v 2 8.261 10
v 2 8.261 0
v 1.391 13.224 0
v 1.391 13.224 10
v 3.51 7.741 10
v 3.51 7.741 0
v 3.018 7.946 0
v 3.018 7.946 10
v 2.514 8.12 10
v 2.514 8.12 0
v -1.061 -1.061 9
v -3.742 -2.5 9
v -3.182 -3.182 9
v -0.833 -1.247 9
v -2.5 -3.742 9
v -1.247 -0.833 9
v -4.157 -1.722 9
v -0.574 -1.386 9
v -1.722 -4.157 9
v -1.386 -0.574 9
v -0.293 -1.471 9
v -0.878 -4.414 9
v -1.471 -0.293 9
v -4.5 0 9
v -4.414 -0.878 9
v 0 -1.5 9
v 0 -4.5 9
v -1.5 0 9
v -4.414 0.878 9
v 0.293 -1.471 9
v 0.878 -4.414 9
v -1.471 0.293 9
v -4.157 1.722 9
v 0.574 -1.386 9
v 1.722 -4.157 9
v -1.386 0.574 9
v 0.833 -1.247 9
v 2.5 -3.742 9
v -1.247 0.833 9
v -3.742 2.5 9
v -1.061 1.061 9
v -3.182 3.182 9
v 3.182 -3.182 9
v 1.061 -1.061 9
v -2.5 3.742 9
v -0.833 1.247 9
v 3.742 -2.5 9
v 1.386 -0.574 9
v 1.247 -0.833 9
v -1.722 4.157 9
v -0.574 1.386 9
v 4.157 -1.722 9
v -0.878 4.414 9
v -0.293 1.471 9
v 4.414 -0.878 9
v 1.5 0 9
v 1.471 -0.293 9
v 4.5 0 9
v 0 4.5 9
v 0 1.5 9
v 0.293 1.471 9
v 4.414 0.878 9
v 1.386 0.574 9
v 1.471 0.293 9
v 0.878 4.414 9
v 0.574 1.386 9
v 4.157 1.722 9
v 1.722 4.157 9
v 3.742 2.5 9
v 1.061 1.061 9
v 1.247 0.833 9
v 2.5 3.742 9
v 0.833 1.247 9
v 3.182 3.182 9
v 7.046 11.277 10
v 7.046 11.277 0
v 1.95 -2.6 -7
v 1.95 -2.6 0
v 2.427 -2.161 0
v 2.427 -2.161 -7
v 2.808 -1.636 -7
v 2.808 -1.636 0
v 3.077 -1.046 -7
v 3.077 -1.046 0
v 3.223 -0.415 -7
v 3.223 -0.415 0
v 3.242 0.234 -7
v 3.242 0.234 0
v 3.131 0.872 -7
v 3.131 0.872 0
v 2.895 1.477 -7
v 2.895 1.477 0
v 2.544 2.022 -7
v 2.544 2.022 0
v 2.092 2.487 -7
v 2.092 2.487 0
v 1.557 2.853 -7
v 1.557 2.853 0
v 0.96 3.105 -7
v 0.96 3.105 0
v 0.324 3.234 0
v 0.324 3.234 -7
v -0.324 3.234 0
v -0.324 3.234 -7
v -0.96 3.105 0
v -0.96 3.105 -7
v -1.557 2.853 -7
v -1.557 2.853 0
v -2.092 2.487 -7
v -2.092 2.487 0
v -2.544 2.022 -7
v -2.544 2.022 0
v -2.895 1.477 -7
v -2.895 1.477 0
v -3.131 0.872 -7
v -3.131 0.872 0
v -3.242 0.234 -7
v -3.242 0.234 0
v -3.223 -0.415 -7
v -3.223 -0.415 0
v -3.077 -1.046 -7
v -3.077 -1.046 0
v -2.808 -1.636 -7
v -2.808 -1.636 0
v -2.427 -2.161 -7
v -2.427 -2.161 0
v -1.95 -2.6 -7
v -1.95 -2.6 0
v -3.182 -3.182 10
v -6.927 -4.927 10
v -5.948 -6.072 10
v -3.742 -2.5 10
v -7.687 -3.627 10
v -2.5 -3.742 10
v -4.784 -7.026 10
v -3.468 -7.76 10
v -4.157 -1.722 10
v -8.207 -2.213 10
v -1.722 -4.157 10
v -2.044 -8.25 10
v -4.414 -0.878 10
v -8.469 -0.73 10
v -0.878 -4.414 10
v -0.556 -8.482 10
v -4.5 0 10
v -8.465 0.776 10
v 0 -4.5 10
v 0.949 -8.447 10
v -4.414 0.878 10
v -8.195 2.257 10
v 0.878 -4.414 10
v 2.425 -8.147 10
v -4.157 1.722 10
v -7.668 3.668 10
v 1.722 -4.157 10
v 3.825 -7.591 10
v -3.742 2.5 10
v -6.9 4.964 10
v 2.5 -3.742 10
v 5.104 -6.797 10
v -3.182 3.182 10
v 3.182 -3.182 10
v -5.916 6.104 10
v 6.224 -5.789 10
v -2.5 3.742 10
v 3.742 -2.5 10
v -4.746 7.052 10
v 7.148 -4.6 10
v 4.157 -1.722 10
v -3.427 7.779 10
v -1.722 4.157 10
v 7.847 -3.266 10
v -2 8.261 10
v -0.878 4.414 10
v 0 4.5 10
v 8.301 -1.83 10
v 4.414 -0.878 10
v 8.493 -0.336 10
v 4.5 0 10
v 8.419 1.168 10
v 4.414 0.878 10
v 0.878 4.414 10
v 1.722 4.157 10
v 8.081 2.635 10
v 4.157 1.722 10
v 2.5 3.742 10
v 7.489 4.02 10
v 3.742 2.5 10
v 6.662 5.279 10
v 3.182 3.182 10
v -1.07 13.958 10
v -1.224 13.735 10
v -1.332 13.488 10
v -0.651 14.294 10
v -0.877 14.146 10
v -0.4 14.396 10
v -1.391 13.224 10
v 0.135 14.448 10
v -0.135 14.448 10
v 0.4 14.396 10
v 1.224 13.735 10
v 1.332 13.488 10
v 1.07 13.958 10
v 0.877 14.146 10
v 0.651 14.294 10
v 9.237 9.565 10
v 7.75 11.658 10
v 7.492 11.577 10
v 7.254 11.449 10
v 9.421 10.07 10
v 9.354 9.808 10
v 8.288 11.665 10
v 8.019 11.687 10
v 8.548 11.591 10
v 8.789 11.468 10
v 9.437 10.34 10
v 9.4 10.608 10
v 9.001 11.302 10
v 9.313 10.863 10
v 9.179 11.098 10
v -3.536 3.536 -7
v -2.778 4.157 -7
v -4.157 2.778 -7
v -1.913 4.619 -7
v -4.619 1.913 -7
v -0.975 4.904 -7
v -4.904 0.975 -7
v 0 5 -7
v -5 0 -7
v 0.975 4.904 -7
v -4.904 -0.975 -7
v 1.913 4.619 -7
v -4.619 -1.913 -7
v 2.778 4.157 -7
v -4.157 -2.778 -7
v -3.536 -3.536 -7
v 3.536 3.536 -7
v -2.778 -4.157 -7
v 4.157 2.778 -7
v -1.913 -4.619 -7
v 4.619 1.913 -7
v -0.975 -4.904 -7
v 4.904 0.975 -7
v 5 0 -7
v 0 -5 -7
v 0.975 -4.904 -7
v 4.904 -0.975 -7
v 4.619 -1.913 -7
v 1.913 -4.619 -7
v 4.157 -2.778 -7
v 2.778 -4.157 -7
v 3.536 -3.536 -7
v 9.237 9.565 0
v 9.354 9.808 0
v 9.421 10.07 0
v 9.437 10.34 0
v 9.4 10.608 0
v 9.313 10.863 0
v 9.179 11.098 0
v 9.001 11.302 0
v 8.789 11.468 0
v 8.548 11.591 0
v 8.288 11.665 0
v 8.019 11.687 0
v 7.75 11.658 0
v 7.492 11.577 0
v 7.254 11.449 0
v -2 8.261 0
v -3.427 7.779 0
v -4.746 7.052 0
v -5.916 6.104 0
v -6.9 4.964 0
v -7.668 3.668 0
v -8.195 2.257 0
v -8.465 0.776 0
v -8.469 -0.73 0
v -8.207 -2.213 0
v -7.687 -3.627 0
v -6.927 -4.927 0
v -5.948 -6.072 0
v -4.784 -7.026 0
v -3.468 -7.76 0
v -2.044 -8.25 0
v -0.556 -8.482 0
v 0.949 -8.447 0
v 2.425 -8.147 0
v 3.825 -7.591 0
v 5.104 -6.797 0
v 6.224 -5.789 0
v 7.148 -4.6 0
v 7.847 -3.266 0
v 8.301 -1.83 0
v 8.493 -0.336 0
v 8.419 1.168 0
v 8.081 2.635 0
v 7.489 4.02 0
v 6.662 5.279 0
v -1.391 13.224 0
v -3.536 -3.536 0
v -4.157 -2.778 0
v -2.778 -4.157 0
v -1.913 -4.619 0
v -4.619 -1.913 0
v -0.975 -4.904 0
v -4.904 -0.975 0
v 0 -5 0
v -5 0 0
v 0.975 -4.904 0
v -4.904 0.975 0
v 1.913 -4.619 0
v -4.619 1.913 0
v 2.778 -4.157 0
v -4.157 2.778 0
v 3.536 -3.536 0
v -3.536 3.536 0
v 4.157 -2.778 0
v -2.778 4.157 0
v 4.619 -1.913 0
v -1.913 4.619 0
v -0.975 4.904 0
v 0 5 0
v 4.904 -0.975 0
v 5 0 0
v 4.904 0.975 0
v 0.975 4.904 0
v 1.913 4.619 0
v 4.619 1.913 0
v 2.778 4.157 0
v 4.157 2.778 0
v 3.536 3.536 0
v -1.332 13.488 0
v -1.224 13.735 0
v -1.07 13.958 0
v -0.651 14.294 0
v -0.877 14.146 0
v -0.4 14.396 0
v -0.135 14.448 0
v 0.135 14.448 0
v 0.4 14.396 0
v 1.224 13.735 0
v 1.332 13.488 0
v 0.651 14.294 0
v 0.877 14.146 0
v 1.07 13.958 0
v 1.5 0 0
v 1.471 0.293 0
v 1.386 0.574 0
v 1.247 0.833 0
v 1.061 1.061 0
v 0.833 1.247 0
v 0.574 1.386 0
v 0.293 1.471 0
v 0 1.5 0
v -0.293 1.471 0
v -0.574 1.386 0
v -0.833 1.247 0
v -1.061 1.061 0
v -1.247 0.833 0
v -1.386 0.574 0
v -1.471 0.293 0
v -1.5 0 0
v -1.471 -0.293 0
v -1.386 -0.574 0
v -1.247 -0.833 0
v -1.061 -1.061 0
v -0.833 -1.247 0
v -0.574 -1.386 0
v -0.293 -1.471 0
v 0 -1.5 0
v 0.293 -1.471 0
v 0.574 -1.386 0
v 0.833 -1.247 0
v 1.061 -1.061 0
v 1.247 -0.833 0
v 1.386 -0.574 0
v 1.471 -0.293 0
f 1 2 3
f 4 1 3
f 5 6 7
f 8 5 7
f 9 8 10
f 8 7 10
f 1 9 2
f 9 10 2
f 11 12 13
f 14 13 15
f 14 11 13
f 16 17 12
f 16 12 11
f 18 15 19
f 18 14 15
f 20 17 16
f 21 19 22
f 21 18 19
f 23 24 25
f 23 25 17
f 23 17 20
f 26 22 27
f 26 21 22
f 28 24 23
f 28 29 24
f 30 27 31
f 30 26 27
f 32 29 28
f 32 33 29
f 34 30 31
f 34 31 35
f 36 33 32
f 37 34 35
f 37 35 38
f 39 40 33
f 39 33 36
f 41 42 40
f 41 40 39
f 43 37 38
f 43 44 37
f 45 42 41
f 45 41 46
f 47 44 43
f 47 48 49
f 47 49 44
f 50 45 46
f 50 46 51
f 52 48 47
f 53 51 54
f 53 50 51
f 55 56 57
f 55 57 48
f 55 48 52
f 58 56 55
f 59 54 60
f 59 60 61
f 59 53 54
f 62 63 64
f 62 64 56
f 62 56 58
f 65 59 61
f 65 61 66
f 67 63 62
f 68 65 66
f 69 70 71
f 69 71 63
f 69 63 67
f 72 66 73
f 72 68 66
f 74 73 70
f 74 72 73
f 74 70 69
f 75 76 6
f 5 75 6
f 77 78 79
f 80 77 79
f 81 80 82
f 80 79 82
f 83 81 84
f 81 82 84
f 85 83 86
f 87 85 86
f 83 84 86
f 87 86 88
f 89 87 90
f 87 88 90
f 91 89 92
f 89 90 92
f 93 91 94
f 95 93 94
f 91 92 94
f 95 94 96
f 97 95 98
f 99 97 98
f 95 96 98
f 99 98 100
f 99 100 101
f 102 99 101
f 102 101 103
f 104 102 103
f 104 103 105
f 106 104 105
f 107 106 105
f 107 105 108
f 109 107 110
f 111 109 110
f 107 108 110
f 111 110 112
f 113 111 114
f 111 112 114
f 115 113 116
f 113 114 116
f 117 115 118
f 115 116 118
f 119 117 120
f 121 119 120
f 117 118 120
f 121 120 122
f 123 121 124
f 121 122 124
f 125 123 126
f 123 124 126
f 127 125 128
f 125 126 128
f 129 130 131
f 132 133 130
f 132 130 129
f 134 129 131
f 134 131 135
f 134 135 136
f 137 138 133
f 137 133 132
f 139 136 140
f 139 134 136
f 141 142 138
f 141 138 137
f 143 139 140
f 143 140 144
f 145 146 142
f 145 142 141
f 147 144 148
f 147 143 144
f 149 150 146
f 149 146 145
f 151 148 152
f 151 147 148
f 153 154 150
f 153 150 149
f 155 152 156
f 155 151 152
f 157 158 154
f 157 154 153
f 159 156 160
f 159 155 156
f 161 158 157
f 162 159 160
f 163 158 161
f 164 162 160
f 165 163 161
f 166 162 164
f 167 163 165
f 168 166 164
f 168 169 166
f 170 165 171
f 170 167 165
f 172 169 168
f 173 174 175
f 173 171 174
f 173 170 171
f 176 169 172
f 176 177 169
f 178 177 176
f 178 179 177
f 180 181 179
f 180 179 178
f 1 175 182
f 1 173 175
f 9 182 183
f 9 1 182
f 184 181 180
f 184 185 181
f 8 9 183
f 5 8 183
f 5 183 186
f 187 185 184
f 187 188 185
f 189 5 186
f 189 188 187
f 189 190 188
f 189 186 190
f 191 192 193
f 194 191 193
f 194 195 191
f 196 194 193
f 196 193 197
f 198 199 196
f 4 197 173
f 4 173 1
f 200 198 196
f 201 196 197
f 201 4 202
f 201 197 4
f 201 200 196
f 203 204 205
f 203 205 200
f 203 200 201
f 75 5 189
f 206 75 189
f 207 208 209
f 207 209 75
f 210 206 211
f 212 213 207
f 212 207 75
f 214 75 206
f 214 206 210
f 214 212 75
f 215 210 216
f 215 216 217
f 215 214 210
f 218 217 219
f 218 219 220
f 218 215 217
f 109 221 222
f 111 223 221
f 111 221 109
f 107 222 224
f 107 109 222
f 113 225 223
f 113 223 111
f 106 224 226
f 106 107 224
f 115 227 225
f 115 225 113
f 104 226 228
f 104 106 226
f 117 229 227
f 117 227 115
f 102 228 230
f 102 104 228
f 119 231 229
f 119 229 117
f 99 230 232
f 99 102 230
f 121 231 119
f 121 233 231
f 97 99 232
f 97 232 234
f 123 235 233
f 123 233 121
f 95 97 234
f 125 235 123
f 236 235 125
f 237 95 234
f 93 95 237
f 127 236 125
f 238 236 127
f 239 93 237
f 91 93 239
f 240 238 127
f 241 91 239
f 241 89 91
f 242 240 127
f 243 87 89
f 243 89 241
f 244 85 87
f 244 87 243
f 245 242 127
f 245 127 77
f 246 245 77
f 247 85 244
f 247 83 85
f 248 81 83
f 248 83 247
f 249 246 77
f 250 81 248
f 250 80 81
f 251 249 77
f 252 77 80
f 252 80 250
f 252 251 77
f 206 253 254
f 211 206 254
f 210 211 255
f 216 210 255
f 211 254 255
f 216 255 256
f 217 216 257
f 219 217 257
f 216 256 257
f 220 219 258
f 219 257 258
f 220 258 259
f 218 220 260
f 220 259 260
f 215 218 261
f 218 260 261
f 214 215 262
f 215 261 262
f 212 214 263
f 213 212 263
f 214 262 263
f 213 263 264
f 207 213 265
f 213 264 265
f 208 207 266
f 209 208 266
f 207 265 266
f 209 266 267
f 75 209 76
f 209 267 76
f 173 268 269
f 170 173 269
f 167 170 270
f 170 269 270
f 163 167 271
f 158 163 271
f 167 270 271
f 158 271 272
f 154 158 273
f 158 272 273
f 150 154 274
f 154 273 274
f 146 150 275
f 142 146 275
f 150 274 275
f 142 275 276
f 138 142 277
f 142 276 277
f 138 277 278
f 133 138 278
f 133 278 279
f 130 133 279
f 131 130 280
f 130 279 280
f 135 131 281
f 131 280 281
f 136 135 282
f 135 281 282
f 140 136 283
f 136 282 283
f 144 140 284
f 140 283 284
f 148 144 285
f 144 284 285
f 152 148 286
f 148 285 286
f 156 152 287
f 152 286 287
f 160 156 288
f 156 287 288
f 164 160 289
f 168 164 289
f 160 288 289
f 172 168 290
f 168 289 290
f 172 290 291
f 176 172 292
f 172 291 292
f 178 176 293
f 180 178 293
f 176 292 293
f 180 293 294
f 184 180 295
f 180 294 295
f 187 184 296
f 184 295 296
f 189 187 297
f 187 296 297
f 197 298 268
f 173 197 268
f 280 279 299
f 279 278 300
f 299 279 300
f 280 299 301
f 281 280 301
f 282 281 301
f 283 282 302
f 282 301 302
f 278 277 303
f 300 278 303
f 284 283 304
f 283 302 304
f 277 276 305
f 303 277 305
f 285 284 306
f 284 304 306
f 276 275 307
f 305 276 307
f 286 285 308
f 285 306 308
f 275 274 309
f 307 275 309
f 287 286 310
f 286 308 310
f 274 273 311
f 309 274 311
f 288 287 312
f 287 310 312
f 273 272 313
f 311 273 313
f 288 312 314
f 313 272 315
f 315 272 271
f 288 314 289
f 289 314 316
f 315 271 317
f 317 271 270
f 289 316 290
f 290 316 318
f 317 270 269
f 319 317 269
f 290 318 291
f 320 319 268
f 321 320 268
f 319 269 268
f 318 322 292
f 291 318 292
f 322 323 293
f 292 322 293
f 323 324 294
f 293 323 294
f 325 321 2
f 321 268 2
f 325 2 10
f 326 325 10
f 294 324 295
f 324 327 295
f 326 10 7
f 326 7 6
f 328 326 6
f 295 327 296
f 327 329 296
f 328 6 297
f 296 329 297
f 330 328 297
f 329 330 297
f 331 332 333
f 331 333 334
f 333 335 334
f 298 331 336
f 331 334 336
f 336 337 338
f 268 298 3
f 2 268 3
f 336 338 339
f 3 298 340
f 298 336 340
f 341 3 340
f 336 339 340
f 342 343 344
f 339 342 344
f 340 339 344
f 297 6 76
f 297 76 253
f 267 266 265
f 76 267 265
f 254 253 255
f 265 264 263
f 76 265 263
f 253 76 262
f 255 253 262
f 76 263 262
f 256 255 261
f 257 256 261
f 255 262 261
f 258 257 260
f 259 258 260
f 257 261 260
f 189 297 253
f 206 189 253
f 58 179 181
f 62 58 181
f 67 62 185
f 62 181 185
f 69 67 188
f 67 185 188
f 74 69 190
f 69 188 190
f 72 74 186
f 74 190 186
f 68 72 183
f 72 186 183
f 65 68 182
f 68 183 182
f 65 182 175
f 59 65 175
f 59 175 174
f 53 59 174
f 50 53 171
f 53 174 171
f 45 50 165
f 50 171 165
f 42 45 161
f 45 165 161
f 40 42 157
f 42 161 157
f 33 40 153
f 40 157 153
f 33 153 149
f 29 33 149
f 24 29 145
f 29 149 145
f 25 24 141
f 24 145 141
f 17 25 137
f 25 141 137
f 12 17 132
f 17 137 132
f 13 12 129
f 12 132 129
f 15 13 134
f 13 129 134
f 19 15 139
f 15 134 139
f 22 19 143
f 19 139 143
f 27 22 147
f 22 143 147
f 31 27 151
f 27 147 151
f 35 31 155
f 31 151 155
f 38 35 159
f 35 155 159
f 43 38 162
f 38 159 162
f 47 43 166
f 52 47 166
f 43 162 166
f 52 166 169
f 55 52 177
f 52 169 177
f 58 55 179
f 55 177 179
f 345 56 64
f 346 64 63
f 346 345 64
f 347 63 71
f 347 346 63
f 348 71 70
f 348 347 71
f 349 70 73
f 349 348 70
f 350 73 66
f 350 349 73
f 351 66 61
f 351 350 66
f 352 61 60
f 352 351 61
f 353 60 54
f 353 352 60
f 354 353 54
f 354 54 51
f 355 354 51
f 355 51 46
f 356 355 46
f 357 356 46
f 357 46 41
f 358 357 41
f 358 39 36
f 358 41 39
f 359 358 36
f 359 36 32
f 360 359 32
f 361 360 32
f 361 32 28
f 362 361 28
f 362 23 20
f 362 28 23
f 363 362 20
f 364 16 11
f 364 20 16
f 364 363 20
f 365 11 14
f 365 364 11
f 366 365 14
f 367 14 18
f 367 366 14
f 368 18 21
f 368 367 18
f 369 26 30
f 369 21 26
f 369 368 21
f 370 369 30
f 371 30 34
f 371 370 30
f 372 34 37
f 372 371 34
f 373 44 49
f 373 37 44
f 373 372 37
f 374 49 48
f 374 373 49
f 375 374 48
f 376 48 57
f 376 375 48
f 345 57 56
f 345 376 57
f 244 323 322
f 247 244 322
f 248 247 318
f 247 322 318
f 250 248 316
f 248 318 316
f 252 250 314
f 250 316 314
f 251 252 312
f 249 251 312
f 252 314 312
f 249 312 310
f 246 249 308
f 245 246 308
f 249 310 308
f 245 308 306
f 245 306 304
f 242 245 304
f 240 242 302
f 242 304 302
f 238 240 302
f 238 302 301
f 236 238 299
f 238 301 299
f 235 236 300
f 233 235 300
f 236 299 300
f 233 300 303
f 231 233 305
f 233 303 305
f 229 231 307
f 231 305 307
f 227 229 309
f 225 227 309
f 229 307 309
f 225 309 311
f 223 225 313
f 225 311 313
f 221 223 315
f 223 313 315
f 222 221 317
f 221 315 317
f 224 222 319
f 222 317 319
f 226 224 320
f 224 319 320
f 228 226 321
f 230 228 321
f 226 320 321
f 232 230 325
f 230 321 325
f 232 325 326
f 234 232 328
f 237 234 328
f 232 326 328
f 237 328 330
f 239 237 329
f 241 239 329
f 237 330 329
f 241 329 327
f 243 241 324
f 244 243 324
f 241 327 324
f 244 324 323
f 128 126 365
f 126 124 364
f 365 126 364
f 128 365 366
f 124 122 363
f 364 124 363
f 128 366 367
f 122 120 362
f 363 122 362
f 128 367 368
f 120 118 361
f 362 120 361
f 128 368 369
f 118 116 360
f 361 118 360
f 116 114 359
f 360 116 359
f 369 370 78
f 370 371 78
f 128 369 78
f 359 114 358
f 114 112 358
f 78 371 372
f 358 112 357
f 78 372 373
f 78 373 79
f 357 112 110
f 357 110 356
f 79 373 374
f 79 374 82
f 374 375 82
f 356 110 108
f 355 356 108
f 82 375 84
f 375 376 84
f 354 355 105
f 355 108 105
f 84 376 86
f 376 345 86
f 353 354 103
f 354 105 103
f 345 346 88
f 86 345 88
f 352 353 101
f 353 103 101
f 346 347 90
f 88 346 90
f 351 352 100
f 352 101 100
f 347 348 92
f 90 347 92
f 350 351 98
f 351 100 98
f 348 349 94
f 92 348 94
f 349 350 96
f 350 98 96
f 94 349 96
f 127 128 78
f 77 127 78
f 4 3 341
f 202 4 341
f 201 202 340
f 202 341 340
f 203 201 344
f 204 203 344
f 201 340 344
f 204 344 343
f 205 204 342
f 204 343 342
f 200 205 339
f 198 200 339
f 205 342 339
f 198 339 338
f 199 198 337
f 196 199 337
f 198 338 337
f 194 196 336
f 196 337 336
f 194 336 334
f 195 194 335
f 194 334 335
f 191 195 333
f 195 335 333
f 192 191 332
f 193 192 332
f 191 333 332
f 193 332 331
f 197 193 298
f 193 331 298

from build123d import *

# Parameters (mm, degrees)
SKETCH1_R           = 1.5
BOSS_EXTRUDE1_DEPTH = 10
SKETCH5_R           = 5
BOSS_EXTRUDE3_DEPTH = 7
SKETCH8_R           = 4.5
CUT_EXTRUDE2_DEPTH  = 1


with BuildPart() as part:
    # Sketch1 → Boss-Extrude1 (new body)
    with BuildSketch(Plane.XY):
        with BuildLine():
            Line((-1.390653283, 13.224086579), (-2, 8.261355821))
            ThreePointArc((-2, 8.261355821), (-2.767329313, -8.036907893), (6.66222002, 5.278714276))
            Line((6.66222002, 5.278714276), (9.237410395, 9.564550779))
            ThreePointArc((9.237410395, 9.564550779), (8.899037344, 11.390248383), (7.045710912, 11.276894083))
            Line((7.045710912, 11.276894083), (3.510177006, 7.741360177))
            ThreePointArc((3.510177006, 7.741360177), (2.767329313, 8.036907893), (2, 8.261355821))
            Line((2, 8.261355821), (1.390653283, 13.224086579))
            ThreePointArc((1.390653283, 13.224086579), (0, 14.454432673), (-1.390653283, 13.224086579))
        make_face()
        Circle(SKETCH1_R, mode=Mode.SUBTRACT)
    extrude(amount=BOSS_EXTRUDE1_DEPTH)

    # Sketch5 → Boss-Extrude3 (add)
    with BuildSketch(Plane(origin=(0, 0, 0), x_dir=(-1, 0, 0), z_dir=(0, 0, -1))):
        with Locations(Location((0, 0, 0), (0, 0, 180))):
            Circle(SKETCH5_R)
        with BuildLine():
            Line((1.95, -2.6), (-1.95, -2.6))
            ThreePointArc((-1.95, -2.6), (0, 3.25), (1.95, -2.6))
        make_face(mode=Mode.SUBTRACT)
    extrude(amount=BOSS_EXTRUDE3_DEPTH)

    # Sketch8 → Cut-Extrude2 (cut)
    with BuildSketch(Plane.XY.offset(10)):
        Circle(SKETCH8_R)
    extrude(amount=-CUT_EXTRUDE2_DEPTH, mode=Mode.SUBTRACT)


solid = part.part
